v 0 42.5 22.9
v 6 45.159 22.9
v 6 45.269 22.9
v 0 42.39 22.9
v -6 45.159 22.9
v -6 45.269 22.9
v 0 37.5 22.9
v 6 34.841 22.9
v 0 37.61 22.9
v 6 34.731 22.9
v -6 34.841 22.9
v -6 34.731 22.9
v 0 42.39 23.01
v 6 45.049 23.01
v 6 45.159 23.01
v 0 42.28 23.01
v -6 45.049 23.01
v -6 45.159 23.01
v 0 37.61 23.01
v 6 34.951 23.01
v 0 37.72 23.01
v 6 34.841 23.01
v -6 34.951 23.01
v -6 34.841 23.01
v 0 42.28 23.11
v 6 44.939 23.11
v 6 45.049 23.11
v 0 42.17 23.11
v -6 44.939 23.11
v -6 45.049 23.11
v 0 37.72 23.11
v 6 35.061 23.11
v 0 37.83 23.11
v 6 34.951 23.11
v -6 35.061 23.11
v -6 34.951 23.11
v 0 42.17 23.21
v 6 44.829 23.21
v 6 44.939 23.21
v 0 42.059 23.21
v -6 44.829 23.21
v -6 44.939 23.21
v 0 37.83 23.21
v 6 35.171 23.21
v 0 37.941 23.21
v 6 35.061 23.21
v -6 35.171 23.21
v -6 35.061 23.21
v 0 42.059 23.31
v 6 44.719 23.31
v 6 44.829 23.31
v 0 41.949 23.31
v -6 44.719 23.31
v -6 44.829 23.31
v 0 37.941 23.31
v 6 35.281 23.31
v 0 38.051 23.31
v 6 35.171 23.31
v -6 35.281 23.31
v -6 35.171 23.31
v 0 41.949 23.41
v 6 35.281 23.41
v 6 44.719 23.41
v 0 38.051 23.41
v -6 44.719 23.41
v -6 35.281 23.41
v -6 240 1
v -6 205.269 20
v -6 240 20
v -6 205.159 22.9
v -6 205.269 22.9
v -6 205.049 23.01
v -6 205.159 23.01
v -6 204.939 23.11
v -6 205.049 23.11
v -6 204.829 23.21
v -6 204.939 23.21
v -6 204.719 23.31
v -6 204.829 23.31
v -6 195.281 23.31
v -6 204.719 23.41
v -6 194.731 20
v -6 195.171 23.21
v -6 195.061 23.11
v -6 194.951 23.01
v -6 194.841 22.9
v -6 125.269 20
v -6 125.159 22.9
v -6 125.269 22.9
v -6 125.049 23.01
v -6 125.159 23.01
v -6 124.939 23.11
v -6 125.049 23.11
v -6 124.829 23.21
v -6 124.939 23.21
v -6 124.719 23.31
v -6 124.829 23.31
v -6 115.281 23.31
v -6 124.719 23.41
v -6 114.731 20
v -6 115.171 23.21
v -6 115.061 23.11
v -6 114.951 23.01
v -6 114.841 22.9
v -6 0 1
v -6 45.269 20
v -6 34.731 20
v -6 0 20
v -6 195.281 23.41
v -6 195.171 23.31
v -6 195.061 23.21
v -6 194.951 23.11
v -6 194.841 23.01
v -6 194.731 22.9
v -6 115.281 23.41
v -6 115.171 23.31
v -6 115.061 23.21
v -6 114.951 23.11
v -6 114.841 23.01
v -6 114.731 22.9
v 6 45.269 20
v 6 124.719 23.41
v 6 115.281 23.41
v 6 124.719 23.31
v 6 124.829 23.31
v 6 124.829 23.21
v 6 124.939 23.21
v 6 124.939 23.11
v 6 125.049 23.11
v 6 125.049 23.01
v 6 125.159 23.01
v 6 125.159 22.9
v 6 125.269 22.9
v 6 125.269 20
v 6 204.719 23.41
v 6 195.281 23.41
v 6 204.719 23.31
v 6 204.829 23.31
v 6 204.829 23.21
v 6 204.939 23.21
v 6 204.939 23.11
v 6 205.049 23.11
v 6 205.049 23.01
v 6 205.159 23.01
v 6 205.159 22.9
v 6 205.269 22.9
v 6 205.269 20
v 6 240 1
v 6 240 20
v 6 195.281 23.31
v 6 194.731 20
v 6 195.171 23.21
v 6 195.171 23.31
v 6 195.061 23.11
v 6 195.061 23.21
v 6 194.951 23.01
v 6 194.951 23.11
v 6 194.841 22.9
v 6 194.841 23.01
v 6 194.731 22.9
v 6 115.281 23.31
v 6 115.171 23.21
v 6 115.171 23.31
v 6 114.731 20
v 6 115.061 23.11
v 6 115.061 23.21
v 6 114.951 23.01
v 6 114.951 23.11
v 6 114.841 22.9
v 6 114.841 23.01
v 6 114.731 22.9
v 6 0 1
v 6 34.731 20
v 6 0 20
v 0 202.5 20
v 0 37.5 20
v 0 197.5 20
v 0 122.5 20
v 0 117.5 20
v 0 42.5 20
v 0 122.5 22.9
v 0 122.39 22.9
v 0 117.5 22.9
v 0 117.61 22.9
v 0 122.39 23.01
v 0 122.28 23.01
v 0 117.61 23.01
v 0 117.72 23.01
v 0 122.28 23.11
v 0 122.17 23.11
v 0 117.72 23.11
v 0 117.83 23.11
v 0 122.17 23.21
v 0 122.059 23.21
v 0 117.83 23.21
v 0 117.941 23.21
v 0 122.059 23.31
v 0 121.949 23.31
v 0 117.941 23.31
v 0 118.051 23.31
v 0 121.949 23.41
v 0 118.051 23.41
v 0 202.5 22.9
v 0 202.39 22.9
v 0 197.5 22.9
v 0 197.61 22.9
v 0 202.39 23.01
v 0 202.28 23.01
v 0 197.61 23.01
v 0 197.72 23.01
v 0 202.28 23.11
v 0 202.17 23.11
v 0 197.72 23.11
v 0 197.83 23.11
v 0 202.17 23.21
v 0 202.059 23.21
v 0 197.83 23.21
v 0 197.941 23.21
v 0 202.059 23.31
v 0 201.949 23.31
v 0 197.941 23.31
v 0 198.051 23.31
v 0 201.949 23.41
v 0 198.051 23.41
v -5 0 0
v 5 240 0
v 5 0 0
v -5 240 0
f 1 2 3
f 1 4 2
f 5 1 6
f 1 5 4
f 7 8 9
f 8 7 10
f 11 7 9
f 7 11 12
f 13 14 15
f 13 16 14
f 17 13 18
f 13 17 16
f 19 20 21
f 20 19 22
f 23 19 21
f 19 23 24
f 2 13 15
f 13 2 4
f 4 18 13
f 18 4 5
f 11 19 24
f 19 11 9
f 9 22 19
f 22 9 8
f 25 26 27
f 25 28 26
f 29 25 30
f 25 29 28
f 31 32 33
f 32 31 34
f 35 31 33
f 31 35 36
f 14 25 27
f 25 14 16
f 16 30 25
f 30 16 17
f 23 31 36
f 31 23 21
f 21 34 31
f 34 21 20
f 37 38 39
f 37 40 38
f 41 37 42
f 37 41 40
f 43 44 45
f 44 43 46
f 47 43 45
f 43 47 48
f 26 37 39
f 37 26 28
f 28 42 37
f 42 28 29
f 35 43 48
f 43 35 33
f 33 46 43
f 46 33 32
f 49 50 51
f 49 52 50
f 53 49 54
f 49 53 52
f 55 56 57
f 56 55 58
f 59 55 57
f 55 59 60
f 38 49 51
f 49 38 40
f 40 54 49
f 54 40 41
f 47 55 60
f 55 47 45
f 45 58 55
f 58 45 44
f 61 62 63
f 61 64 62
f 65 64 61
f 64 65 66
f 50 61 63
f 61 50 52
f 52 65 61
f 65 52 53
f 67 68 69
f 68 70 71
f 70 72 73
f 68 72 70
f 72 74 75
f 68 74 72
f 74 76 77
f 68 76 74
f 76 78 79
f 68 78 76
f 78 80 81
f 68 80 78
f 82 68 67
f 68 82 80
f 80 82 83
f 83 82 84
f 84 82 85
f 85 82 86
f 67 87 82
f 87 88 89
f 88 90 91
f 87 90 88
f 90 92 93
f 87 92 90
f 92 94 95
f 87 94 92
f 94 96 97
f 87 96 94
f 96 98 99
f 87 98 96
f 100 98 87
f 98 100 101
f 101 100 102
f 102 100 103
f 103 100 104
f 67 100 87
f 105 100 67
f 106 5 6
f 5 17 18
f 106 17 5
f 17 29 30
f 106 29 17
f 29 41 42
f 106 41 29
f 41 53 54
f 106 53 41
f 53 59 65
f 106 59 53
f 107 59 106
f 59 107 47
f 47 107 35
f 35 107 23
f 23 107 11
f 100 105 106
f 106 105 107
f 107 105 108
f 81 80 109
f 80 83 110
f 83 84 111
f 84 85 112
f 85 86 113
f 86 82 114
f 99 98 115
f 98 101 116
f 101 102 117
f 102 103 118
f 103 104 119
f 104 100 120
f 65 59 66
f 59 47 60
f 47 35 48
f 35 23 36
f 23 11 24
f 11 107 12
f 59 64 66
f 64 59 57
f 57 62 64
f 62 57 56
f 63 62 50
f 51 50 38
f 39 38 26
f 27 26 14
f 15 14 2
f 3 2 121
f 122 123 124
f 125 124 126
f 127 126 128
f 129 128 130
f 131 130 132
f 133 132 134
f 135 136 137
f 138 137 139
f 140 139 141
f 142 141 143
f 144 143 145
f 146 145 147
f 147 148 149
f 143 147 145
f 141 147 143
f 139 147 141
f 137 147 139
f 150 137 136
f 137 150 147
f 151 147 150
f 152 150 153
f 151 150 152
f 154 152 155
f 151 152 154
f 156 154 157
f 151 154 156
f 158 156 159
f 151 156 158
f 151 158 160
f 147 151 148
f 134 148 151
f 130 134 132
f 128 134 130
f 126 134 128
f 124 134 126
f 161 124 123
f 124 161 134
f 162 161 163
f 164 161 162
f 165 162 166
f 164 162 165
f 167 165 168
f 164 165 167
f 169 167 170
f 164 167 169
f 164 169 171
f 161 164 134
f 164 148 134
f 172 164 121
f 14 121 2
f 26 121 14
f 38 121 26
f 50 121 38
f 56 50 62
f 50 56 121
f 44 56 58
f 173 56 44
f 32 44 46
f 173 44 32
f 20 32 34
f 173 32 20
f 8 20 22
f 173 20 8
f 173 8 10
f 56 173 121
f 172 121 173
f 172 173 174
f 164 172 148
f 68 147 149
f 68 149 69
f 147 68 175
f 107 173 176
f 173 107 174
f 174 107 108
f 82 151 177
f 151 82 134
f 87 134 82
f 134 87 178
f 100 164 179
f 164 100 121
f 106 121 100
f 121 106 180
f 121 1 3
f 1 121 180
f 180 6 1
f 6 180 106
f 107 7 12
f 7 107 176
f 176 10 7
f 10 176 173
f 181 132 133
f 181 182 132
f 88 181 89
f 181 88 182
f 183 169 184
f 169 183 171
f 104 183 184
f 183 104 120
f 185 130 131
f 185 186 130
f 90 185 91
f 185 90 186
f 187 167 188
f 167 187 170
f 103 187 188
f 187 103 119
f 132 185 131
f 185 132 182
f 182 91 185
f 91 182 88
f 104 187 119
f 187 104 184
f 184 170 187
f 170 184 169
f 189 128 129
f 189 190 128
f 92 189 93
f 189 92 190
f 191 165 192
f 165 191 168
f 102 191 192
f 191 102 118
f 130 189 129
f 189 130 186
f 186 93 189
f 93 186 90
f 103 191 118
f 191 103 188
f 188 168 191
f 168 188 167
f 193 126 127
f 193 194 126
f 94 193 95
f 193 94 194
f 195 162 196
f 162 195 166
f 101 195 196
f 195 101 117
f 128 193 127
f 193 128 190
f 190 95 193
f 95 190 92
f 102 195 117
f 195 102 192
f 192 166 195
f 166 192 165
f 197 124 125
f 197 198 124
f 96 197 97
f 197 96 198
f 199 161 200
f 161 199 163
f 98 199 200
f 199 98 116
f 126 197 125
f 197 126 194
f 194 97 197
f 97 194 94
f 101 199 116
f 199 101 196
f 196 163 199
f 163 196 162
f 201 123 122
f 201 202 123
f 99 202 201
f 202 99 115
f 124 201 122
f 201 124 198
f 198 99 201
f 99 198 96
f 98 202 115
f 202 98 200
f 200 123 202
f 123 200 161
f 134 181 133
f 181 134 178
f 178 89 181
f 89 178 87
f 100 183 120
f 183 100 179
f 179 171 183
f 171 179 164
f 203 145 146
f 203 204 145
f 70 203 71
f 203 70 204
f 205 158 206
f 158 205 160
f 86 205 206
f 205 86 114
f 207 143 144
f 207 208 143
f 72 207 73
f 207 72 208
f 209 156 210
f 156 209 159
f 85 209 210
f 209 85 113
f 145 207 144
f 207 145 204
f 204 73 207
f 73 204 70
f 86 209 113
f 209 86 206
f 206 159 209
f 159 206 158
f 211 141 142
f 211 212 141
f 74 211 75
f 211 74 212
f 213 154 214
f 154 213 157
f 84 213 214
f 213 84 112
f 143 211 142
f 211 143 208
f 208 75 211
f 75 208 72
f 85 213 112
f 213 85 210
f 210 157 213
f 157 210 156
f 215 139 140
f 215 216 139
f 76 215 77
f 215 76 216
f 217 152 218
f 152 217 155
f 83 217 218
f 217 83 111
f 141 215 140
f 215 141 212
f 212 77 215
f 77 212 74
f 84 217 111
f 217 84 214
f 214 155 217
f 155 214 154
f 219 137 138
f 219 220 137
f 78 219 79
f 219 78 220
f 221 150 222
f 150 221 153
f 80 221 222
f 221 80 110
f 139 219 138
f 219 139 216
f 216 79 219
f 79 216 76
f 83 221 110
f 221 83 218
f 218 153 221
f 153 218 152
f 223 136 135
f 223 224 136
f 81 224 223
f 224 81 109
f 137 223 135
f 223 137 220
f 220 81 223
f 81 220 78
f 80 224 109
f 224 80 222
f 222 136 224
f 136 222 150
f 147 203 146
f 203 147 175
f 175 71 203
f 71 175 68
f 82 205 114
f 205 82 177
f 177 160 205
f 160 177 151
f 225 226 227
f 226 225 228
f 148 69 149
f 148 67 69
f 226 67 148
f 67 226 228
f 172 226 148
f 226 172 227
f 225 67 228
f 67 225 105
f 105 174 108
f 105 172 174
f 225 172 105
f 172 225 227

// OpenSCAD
// file: skadis-lib.scad
// Shared pieces for the SKÅDIS accessories. Not printed on its own.
//
// Frame for an accessory: the board's FRONT face is the plane y = 0 (the board fills
// y -5..0), x runs across the board, z up, and z = 0 is the centre of the slot the upper
// hanger uses. Every accessory is built in this frame and saved with as_print(), which lays
// it on its side (x becomes the print's z), so the hangers print with their layers running
// along the lip and nothing needs support.
//
// The hanger is IKEA's own way of holding on, proven on skadis-hook.scad: a 4.6 mm wide tab
// goes through a slot and a lip behind the board drops 5.9 mm below the slot; a short peg
// sits in the slot 40 mm below so the piece cannot tip, swing or lift by accident. Lift it
// 6 mm to take it off. Two hangers 40 mm apart (two slots of one row) carry anything heavy.
//
// Profile (u out from the front face, v up from the upper slot's centre), dropped position:
//   tab  u -5.2..0,    v -5.9..-1    rests on the slot's rounded bottom (-5.98 for a 4.6 tab)
//   lip  u -8.2..-5.2, v -11.8..-1   5.8 mm of board behind it
//   peg  u -3..0,      v -45.6..-40.6
// Raised 5.9 for fitting, the tab and lip (10.8 tall) pass the slot, whose straight height
// for a 4.6 mm part is 11.96; the peg stays inside the lower slot (usable -45.98..-34.02).

hanger_w = 4.6;
hanger_drop = 5.9;
hanger_bottom = -45.6;        // the lowest point of a hanger (the peg's bottom)
key_len = 13; key_neck = 5; key_tip = 11; key_depth = 3.5;
key_poly = [[-key_len / 2, -key_tip / 2], [-key_len / 2, key_tip / 2], [0, key_neck / 2], [key_len / 2, key_tip / 2], [key_len / 2, -key_tip / 2], [0, -key_neck / 2]];

module hanger2d() {
    translate([-5.2, -5.9]) square([5.2 + 0.01, 4.9]);
    translate([-8.2, -11.8]) square([3, 10.8]);
    translate([-3, -45.6]) square([3 + 0.01, 5]);
}
// extrude a 2D (u, v) profile along x, from x0 to x0 + w
module along_x(x0, w) multmatrix([[0, 0, 1, x0], [1, 0, 0, 0], [0, 1, 0, 0], [0, 0, 0, 1]]) linear_extrude(w) children();
module hanger(x) along_x(x - hanger_w / 2, hanger_w) hanger2d();
module hangers(xs) for (x = xs) hanger(x);
// a slab from the front face: u 0..t, v v0..v1, x x0..x1 (the spine that sits on the board)
module spine(x0, x1, v0, v1, t = 4) translate([x0, 0, v0]) cube([x1 - x0, t, v1 - v0]);
// lay the finished accessory on its side for printing: x up, lying on its x = 0 face
module as_print() rotate([0, -90, 0]) children();
// rounded 2D rectangle, for arms and lips
module rr(w, h, r) offset(r = r, $fn = 24) offset(delta = -r) square([w, h]);
// main file
// Stiffening ribs for the back of the SKÅDIS board. This is what stops the board being
// flimsy: a 5 mm printed tile is bendier than IKEA's fibreboard, every joint between tiles
// is a hinge, and the whole board stands on clamps at its bottom edge. A rib glued along
// each upright joint makes that joint rigid for its whole length, and ribs down the middle
// of each tile, crossing the level joints, stiffen the board top to bottom. Together they
// make the 3 x 3 board about 20 times stiffer against a push on its top edge.
//
// Where they go, and why nothing is lost: the slots sit in columns at x = 10 and 30 (mod 40),
// so the back of a tile is solid, full height, in 15 mm bands centred on every x = 20, 40,
// 60 ... and on the joint lines themselves. A 12 mm rib in such a band covers no slot and
// stays 1.5 mm clear of the slots either side, where IKEA's hook tabs drop behind the board.
// Level (horizontal) ribs are impossible: the solid band between rows is 5 mm and sits
// right under a row of slots, where the hook tabs hang.
//
// Keys: the rib carries the bow-tie keys of the pockets it covers, built in (same shape as
// skadis-key.scad, the original fit, clipped to the rib's width: the dovetail still flares
// from 5 to 10.5). So a joint rib drops into the three pockets of that joint instead of
// three loose keys, is located by them, and is then glued (CA, a bead each side). keys = []
// gives a flat rib to glue over keys that are already in.
//
// Pieces (print count for a 3 x 3 board):
//   rib-240-k3-x4   L 240, keys at 40 120 200   upright joints, 80..320 and 320..560
//   rib-80-k1-x2    L 80,  key at 40             upright joints, 0..80
//   rib-160-k2-x2   L 160, keys at 40 120        upright joints, 560..720
//   rib-240-k1-x6   L 240, key at 120, along     tile-centre bands x 120 360 600, 120..360 and 360..600
//   rib-240-k0      L 240, no keys               flat, for joints whose keys are already in
// The upright-joint ribs are staggered (ends at 80, 320, 560) so every level joint is
// crossed by a rib, and the rib ends never fall on a pocket. The centre-band ribs start at
// 120 so they clear the clamp frames' uprights (113 mm tall) at the bottom.
//
// Print on the outer face (as saved: keys up), PETG, 3 walls, 15-20 % gyroid. 240 x 12 x 20.
//   openscad -D L=240 -D 'keys=[40,120,200]' -o rib-240-k3-x4.stl skadis-rib.scad
//   openscad -D L=240 -D 'keys=[120]' -D along=true -o rib-240-k1-x6.stl skadis-rib.scad

include <skadis-lib.scad>

L = 240;
keys = [40, 120, 200];   // key centres, mm from the rib's start (an empty list for a flat rib)
along = false;           // false: keys run across the rib (an upright joint); true: along it (a centre-band rib crossing a level joint)
width = 12;              // across the band: 15 is solid, 12 leaves 1.5 mm to the slots
depth = 20;              // out from the board; stiffness grows with the cube of this
cham = 1;                // on the outer edges
key_h = key_depth - 0.1; key_cham = 0.5;

module key_up() {   // original key, clipped to the rib's width, chamfer on top (the camming face)
    steps = 5;
    intersection() {
        union() {
            linear_extrude(key_h - key_cham) polygon(key_poly);
            for (i = [0 : steps - 1]) translate([0, 0, key_h - key_cham + i * key_cham / steps]) linear_extrude(key_cham / steps + 0.01) offset(delta = -key_cham * (i + 1) / steps) polygon(key_poly);
        }
        translate([-width / 2, -10, -1]) cube([width, 20, 10]);   // clip across the rib (x); nothing to clip along it
    }
}
// y along the rib, x across it, z out from the board: the face at z = 0 sits on the board
module body() hull() {
    translate([-width / 2, 0, 0]) cube([width, L, depth - cham]);
    translate([-width / 2 + cham, 0, 0]) cube([width - 2 * cham, L, depth]);
}
// keys on the board face: an upright joint's pockets run their 13 across the joint (across
// the rib); a level joint's pockets run their 13 along the rib. Both are 180° symmetric, so
// the rib fits either way round. `along` = true for the centre-band ribs. The clip to the
// rib's width only touches the across keys (13 long on a 12 rib). Saved keys up, the outer
// face on the bed.
translate([0, 0, depth]) mirror([0, 0, 1]) {
    body();
    for (k = keys) translate([0, k, 0]) mirror([0, 0, 1]) rotate([0, 0, along ? 90 : 0]) key_up();
}
